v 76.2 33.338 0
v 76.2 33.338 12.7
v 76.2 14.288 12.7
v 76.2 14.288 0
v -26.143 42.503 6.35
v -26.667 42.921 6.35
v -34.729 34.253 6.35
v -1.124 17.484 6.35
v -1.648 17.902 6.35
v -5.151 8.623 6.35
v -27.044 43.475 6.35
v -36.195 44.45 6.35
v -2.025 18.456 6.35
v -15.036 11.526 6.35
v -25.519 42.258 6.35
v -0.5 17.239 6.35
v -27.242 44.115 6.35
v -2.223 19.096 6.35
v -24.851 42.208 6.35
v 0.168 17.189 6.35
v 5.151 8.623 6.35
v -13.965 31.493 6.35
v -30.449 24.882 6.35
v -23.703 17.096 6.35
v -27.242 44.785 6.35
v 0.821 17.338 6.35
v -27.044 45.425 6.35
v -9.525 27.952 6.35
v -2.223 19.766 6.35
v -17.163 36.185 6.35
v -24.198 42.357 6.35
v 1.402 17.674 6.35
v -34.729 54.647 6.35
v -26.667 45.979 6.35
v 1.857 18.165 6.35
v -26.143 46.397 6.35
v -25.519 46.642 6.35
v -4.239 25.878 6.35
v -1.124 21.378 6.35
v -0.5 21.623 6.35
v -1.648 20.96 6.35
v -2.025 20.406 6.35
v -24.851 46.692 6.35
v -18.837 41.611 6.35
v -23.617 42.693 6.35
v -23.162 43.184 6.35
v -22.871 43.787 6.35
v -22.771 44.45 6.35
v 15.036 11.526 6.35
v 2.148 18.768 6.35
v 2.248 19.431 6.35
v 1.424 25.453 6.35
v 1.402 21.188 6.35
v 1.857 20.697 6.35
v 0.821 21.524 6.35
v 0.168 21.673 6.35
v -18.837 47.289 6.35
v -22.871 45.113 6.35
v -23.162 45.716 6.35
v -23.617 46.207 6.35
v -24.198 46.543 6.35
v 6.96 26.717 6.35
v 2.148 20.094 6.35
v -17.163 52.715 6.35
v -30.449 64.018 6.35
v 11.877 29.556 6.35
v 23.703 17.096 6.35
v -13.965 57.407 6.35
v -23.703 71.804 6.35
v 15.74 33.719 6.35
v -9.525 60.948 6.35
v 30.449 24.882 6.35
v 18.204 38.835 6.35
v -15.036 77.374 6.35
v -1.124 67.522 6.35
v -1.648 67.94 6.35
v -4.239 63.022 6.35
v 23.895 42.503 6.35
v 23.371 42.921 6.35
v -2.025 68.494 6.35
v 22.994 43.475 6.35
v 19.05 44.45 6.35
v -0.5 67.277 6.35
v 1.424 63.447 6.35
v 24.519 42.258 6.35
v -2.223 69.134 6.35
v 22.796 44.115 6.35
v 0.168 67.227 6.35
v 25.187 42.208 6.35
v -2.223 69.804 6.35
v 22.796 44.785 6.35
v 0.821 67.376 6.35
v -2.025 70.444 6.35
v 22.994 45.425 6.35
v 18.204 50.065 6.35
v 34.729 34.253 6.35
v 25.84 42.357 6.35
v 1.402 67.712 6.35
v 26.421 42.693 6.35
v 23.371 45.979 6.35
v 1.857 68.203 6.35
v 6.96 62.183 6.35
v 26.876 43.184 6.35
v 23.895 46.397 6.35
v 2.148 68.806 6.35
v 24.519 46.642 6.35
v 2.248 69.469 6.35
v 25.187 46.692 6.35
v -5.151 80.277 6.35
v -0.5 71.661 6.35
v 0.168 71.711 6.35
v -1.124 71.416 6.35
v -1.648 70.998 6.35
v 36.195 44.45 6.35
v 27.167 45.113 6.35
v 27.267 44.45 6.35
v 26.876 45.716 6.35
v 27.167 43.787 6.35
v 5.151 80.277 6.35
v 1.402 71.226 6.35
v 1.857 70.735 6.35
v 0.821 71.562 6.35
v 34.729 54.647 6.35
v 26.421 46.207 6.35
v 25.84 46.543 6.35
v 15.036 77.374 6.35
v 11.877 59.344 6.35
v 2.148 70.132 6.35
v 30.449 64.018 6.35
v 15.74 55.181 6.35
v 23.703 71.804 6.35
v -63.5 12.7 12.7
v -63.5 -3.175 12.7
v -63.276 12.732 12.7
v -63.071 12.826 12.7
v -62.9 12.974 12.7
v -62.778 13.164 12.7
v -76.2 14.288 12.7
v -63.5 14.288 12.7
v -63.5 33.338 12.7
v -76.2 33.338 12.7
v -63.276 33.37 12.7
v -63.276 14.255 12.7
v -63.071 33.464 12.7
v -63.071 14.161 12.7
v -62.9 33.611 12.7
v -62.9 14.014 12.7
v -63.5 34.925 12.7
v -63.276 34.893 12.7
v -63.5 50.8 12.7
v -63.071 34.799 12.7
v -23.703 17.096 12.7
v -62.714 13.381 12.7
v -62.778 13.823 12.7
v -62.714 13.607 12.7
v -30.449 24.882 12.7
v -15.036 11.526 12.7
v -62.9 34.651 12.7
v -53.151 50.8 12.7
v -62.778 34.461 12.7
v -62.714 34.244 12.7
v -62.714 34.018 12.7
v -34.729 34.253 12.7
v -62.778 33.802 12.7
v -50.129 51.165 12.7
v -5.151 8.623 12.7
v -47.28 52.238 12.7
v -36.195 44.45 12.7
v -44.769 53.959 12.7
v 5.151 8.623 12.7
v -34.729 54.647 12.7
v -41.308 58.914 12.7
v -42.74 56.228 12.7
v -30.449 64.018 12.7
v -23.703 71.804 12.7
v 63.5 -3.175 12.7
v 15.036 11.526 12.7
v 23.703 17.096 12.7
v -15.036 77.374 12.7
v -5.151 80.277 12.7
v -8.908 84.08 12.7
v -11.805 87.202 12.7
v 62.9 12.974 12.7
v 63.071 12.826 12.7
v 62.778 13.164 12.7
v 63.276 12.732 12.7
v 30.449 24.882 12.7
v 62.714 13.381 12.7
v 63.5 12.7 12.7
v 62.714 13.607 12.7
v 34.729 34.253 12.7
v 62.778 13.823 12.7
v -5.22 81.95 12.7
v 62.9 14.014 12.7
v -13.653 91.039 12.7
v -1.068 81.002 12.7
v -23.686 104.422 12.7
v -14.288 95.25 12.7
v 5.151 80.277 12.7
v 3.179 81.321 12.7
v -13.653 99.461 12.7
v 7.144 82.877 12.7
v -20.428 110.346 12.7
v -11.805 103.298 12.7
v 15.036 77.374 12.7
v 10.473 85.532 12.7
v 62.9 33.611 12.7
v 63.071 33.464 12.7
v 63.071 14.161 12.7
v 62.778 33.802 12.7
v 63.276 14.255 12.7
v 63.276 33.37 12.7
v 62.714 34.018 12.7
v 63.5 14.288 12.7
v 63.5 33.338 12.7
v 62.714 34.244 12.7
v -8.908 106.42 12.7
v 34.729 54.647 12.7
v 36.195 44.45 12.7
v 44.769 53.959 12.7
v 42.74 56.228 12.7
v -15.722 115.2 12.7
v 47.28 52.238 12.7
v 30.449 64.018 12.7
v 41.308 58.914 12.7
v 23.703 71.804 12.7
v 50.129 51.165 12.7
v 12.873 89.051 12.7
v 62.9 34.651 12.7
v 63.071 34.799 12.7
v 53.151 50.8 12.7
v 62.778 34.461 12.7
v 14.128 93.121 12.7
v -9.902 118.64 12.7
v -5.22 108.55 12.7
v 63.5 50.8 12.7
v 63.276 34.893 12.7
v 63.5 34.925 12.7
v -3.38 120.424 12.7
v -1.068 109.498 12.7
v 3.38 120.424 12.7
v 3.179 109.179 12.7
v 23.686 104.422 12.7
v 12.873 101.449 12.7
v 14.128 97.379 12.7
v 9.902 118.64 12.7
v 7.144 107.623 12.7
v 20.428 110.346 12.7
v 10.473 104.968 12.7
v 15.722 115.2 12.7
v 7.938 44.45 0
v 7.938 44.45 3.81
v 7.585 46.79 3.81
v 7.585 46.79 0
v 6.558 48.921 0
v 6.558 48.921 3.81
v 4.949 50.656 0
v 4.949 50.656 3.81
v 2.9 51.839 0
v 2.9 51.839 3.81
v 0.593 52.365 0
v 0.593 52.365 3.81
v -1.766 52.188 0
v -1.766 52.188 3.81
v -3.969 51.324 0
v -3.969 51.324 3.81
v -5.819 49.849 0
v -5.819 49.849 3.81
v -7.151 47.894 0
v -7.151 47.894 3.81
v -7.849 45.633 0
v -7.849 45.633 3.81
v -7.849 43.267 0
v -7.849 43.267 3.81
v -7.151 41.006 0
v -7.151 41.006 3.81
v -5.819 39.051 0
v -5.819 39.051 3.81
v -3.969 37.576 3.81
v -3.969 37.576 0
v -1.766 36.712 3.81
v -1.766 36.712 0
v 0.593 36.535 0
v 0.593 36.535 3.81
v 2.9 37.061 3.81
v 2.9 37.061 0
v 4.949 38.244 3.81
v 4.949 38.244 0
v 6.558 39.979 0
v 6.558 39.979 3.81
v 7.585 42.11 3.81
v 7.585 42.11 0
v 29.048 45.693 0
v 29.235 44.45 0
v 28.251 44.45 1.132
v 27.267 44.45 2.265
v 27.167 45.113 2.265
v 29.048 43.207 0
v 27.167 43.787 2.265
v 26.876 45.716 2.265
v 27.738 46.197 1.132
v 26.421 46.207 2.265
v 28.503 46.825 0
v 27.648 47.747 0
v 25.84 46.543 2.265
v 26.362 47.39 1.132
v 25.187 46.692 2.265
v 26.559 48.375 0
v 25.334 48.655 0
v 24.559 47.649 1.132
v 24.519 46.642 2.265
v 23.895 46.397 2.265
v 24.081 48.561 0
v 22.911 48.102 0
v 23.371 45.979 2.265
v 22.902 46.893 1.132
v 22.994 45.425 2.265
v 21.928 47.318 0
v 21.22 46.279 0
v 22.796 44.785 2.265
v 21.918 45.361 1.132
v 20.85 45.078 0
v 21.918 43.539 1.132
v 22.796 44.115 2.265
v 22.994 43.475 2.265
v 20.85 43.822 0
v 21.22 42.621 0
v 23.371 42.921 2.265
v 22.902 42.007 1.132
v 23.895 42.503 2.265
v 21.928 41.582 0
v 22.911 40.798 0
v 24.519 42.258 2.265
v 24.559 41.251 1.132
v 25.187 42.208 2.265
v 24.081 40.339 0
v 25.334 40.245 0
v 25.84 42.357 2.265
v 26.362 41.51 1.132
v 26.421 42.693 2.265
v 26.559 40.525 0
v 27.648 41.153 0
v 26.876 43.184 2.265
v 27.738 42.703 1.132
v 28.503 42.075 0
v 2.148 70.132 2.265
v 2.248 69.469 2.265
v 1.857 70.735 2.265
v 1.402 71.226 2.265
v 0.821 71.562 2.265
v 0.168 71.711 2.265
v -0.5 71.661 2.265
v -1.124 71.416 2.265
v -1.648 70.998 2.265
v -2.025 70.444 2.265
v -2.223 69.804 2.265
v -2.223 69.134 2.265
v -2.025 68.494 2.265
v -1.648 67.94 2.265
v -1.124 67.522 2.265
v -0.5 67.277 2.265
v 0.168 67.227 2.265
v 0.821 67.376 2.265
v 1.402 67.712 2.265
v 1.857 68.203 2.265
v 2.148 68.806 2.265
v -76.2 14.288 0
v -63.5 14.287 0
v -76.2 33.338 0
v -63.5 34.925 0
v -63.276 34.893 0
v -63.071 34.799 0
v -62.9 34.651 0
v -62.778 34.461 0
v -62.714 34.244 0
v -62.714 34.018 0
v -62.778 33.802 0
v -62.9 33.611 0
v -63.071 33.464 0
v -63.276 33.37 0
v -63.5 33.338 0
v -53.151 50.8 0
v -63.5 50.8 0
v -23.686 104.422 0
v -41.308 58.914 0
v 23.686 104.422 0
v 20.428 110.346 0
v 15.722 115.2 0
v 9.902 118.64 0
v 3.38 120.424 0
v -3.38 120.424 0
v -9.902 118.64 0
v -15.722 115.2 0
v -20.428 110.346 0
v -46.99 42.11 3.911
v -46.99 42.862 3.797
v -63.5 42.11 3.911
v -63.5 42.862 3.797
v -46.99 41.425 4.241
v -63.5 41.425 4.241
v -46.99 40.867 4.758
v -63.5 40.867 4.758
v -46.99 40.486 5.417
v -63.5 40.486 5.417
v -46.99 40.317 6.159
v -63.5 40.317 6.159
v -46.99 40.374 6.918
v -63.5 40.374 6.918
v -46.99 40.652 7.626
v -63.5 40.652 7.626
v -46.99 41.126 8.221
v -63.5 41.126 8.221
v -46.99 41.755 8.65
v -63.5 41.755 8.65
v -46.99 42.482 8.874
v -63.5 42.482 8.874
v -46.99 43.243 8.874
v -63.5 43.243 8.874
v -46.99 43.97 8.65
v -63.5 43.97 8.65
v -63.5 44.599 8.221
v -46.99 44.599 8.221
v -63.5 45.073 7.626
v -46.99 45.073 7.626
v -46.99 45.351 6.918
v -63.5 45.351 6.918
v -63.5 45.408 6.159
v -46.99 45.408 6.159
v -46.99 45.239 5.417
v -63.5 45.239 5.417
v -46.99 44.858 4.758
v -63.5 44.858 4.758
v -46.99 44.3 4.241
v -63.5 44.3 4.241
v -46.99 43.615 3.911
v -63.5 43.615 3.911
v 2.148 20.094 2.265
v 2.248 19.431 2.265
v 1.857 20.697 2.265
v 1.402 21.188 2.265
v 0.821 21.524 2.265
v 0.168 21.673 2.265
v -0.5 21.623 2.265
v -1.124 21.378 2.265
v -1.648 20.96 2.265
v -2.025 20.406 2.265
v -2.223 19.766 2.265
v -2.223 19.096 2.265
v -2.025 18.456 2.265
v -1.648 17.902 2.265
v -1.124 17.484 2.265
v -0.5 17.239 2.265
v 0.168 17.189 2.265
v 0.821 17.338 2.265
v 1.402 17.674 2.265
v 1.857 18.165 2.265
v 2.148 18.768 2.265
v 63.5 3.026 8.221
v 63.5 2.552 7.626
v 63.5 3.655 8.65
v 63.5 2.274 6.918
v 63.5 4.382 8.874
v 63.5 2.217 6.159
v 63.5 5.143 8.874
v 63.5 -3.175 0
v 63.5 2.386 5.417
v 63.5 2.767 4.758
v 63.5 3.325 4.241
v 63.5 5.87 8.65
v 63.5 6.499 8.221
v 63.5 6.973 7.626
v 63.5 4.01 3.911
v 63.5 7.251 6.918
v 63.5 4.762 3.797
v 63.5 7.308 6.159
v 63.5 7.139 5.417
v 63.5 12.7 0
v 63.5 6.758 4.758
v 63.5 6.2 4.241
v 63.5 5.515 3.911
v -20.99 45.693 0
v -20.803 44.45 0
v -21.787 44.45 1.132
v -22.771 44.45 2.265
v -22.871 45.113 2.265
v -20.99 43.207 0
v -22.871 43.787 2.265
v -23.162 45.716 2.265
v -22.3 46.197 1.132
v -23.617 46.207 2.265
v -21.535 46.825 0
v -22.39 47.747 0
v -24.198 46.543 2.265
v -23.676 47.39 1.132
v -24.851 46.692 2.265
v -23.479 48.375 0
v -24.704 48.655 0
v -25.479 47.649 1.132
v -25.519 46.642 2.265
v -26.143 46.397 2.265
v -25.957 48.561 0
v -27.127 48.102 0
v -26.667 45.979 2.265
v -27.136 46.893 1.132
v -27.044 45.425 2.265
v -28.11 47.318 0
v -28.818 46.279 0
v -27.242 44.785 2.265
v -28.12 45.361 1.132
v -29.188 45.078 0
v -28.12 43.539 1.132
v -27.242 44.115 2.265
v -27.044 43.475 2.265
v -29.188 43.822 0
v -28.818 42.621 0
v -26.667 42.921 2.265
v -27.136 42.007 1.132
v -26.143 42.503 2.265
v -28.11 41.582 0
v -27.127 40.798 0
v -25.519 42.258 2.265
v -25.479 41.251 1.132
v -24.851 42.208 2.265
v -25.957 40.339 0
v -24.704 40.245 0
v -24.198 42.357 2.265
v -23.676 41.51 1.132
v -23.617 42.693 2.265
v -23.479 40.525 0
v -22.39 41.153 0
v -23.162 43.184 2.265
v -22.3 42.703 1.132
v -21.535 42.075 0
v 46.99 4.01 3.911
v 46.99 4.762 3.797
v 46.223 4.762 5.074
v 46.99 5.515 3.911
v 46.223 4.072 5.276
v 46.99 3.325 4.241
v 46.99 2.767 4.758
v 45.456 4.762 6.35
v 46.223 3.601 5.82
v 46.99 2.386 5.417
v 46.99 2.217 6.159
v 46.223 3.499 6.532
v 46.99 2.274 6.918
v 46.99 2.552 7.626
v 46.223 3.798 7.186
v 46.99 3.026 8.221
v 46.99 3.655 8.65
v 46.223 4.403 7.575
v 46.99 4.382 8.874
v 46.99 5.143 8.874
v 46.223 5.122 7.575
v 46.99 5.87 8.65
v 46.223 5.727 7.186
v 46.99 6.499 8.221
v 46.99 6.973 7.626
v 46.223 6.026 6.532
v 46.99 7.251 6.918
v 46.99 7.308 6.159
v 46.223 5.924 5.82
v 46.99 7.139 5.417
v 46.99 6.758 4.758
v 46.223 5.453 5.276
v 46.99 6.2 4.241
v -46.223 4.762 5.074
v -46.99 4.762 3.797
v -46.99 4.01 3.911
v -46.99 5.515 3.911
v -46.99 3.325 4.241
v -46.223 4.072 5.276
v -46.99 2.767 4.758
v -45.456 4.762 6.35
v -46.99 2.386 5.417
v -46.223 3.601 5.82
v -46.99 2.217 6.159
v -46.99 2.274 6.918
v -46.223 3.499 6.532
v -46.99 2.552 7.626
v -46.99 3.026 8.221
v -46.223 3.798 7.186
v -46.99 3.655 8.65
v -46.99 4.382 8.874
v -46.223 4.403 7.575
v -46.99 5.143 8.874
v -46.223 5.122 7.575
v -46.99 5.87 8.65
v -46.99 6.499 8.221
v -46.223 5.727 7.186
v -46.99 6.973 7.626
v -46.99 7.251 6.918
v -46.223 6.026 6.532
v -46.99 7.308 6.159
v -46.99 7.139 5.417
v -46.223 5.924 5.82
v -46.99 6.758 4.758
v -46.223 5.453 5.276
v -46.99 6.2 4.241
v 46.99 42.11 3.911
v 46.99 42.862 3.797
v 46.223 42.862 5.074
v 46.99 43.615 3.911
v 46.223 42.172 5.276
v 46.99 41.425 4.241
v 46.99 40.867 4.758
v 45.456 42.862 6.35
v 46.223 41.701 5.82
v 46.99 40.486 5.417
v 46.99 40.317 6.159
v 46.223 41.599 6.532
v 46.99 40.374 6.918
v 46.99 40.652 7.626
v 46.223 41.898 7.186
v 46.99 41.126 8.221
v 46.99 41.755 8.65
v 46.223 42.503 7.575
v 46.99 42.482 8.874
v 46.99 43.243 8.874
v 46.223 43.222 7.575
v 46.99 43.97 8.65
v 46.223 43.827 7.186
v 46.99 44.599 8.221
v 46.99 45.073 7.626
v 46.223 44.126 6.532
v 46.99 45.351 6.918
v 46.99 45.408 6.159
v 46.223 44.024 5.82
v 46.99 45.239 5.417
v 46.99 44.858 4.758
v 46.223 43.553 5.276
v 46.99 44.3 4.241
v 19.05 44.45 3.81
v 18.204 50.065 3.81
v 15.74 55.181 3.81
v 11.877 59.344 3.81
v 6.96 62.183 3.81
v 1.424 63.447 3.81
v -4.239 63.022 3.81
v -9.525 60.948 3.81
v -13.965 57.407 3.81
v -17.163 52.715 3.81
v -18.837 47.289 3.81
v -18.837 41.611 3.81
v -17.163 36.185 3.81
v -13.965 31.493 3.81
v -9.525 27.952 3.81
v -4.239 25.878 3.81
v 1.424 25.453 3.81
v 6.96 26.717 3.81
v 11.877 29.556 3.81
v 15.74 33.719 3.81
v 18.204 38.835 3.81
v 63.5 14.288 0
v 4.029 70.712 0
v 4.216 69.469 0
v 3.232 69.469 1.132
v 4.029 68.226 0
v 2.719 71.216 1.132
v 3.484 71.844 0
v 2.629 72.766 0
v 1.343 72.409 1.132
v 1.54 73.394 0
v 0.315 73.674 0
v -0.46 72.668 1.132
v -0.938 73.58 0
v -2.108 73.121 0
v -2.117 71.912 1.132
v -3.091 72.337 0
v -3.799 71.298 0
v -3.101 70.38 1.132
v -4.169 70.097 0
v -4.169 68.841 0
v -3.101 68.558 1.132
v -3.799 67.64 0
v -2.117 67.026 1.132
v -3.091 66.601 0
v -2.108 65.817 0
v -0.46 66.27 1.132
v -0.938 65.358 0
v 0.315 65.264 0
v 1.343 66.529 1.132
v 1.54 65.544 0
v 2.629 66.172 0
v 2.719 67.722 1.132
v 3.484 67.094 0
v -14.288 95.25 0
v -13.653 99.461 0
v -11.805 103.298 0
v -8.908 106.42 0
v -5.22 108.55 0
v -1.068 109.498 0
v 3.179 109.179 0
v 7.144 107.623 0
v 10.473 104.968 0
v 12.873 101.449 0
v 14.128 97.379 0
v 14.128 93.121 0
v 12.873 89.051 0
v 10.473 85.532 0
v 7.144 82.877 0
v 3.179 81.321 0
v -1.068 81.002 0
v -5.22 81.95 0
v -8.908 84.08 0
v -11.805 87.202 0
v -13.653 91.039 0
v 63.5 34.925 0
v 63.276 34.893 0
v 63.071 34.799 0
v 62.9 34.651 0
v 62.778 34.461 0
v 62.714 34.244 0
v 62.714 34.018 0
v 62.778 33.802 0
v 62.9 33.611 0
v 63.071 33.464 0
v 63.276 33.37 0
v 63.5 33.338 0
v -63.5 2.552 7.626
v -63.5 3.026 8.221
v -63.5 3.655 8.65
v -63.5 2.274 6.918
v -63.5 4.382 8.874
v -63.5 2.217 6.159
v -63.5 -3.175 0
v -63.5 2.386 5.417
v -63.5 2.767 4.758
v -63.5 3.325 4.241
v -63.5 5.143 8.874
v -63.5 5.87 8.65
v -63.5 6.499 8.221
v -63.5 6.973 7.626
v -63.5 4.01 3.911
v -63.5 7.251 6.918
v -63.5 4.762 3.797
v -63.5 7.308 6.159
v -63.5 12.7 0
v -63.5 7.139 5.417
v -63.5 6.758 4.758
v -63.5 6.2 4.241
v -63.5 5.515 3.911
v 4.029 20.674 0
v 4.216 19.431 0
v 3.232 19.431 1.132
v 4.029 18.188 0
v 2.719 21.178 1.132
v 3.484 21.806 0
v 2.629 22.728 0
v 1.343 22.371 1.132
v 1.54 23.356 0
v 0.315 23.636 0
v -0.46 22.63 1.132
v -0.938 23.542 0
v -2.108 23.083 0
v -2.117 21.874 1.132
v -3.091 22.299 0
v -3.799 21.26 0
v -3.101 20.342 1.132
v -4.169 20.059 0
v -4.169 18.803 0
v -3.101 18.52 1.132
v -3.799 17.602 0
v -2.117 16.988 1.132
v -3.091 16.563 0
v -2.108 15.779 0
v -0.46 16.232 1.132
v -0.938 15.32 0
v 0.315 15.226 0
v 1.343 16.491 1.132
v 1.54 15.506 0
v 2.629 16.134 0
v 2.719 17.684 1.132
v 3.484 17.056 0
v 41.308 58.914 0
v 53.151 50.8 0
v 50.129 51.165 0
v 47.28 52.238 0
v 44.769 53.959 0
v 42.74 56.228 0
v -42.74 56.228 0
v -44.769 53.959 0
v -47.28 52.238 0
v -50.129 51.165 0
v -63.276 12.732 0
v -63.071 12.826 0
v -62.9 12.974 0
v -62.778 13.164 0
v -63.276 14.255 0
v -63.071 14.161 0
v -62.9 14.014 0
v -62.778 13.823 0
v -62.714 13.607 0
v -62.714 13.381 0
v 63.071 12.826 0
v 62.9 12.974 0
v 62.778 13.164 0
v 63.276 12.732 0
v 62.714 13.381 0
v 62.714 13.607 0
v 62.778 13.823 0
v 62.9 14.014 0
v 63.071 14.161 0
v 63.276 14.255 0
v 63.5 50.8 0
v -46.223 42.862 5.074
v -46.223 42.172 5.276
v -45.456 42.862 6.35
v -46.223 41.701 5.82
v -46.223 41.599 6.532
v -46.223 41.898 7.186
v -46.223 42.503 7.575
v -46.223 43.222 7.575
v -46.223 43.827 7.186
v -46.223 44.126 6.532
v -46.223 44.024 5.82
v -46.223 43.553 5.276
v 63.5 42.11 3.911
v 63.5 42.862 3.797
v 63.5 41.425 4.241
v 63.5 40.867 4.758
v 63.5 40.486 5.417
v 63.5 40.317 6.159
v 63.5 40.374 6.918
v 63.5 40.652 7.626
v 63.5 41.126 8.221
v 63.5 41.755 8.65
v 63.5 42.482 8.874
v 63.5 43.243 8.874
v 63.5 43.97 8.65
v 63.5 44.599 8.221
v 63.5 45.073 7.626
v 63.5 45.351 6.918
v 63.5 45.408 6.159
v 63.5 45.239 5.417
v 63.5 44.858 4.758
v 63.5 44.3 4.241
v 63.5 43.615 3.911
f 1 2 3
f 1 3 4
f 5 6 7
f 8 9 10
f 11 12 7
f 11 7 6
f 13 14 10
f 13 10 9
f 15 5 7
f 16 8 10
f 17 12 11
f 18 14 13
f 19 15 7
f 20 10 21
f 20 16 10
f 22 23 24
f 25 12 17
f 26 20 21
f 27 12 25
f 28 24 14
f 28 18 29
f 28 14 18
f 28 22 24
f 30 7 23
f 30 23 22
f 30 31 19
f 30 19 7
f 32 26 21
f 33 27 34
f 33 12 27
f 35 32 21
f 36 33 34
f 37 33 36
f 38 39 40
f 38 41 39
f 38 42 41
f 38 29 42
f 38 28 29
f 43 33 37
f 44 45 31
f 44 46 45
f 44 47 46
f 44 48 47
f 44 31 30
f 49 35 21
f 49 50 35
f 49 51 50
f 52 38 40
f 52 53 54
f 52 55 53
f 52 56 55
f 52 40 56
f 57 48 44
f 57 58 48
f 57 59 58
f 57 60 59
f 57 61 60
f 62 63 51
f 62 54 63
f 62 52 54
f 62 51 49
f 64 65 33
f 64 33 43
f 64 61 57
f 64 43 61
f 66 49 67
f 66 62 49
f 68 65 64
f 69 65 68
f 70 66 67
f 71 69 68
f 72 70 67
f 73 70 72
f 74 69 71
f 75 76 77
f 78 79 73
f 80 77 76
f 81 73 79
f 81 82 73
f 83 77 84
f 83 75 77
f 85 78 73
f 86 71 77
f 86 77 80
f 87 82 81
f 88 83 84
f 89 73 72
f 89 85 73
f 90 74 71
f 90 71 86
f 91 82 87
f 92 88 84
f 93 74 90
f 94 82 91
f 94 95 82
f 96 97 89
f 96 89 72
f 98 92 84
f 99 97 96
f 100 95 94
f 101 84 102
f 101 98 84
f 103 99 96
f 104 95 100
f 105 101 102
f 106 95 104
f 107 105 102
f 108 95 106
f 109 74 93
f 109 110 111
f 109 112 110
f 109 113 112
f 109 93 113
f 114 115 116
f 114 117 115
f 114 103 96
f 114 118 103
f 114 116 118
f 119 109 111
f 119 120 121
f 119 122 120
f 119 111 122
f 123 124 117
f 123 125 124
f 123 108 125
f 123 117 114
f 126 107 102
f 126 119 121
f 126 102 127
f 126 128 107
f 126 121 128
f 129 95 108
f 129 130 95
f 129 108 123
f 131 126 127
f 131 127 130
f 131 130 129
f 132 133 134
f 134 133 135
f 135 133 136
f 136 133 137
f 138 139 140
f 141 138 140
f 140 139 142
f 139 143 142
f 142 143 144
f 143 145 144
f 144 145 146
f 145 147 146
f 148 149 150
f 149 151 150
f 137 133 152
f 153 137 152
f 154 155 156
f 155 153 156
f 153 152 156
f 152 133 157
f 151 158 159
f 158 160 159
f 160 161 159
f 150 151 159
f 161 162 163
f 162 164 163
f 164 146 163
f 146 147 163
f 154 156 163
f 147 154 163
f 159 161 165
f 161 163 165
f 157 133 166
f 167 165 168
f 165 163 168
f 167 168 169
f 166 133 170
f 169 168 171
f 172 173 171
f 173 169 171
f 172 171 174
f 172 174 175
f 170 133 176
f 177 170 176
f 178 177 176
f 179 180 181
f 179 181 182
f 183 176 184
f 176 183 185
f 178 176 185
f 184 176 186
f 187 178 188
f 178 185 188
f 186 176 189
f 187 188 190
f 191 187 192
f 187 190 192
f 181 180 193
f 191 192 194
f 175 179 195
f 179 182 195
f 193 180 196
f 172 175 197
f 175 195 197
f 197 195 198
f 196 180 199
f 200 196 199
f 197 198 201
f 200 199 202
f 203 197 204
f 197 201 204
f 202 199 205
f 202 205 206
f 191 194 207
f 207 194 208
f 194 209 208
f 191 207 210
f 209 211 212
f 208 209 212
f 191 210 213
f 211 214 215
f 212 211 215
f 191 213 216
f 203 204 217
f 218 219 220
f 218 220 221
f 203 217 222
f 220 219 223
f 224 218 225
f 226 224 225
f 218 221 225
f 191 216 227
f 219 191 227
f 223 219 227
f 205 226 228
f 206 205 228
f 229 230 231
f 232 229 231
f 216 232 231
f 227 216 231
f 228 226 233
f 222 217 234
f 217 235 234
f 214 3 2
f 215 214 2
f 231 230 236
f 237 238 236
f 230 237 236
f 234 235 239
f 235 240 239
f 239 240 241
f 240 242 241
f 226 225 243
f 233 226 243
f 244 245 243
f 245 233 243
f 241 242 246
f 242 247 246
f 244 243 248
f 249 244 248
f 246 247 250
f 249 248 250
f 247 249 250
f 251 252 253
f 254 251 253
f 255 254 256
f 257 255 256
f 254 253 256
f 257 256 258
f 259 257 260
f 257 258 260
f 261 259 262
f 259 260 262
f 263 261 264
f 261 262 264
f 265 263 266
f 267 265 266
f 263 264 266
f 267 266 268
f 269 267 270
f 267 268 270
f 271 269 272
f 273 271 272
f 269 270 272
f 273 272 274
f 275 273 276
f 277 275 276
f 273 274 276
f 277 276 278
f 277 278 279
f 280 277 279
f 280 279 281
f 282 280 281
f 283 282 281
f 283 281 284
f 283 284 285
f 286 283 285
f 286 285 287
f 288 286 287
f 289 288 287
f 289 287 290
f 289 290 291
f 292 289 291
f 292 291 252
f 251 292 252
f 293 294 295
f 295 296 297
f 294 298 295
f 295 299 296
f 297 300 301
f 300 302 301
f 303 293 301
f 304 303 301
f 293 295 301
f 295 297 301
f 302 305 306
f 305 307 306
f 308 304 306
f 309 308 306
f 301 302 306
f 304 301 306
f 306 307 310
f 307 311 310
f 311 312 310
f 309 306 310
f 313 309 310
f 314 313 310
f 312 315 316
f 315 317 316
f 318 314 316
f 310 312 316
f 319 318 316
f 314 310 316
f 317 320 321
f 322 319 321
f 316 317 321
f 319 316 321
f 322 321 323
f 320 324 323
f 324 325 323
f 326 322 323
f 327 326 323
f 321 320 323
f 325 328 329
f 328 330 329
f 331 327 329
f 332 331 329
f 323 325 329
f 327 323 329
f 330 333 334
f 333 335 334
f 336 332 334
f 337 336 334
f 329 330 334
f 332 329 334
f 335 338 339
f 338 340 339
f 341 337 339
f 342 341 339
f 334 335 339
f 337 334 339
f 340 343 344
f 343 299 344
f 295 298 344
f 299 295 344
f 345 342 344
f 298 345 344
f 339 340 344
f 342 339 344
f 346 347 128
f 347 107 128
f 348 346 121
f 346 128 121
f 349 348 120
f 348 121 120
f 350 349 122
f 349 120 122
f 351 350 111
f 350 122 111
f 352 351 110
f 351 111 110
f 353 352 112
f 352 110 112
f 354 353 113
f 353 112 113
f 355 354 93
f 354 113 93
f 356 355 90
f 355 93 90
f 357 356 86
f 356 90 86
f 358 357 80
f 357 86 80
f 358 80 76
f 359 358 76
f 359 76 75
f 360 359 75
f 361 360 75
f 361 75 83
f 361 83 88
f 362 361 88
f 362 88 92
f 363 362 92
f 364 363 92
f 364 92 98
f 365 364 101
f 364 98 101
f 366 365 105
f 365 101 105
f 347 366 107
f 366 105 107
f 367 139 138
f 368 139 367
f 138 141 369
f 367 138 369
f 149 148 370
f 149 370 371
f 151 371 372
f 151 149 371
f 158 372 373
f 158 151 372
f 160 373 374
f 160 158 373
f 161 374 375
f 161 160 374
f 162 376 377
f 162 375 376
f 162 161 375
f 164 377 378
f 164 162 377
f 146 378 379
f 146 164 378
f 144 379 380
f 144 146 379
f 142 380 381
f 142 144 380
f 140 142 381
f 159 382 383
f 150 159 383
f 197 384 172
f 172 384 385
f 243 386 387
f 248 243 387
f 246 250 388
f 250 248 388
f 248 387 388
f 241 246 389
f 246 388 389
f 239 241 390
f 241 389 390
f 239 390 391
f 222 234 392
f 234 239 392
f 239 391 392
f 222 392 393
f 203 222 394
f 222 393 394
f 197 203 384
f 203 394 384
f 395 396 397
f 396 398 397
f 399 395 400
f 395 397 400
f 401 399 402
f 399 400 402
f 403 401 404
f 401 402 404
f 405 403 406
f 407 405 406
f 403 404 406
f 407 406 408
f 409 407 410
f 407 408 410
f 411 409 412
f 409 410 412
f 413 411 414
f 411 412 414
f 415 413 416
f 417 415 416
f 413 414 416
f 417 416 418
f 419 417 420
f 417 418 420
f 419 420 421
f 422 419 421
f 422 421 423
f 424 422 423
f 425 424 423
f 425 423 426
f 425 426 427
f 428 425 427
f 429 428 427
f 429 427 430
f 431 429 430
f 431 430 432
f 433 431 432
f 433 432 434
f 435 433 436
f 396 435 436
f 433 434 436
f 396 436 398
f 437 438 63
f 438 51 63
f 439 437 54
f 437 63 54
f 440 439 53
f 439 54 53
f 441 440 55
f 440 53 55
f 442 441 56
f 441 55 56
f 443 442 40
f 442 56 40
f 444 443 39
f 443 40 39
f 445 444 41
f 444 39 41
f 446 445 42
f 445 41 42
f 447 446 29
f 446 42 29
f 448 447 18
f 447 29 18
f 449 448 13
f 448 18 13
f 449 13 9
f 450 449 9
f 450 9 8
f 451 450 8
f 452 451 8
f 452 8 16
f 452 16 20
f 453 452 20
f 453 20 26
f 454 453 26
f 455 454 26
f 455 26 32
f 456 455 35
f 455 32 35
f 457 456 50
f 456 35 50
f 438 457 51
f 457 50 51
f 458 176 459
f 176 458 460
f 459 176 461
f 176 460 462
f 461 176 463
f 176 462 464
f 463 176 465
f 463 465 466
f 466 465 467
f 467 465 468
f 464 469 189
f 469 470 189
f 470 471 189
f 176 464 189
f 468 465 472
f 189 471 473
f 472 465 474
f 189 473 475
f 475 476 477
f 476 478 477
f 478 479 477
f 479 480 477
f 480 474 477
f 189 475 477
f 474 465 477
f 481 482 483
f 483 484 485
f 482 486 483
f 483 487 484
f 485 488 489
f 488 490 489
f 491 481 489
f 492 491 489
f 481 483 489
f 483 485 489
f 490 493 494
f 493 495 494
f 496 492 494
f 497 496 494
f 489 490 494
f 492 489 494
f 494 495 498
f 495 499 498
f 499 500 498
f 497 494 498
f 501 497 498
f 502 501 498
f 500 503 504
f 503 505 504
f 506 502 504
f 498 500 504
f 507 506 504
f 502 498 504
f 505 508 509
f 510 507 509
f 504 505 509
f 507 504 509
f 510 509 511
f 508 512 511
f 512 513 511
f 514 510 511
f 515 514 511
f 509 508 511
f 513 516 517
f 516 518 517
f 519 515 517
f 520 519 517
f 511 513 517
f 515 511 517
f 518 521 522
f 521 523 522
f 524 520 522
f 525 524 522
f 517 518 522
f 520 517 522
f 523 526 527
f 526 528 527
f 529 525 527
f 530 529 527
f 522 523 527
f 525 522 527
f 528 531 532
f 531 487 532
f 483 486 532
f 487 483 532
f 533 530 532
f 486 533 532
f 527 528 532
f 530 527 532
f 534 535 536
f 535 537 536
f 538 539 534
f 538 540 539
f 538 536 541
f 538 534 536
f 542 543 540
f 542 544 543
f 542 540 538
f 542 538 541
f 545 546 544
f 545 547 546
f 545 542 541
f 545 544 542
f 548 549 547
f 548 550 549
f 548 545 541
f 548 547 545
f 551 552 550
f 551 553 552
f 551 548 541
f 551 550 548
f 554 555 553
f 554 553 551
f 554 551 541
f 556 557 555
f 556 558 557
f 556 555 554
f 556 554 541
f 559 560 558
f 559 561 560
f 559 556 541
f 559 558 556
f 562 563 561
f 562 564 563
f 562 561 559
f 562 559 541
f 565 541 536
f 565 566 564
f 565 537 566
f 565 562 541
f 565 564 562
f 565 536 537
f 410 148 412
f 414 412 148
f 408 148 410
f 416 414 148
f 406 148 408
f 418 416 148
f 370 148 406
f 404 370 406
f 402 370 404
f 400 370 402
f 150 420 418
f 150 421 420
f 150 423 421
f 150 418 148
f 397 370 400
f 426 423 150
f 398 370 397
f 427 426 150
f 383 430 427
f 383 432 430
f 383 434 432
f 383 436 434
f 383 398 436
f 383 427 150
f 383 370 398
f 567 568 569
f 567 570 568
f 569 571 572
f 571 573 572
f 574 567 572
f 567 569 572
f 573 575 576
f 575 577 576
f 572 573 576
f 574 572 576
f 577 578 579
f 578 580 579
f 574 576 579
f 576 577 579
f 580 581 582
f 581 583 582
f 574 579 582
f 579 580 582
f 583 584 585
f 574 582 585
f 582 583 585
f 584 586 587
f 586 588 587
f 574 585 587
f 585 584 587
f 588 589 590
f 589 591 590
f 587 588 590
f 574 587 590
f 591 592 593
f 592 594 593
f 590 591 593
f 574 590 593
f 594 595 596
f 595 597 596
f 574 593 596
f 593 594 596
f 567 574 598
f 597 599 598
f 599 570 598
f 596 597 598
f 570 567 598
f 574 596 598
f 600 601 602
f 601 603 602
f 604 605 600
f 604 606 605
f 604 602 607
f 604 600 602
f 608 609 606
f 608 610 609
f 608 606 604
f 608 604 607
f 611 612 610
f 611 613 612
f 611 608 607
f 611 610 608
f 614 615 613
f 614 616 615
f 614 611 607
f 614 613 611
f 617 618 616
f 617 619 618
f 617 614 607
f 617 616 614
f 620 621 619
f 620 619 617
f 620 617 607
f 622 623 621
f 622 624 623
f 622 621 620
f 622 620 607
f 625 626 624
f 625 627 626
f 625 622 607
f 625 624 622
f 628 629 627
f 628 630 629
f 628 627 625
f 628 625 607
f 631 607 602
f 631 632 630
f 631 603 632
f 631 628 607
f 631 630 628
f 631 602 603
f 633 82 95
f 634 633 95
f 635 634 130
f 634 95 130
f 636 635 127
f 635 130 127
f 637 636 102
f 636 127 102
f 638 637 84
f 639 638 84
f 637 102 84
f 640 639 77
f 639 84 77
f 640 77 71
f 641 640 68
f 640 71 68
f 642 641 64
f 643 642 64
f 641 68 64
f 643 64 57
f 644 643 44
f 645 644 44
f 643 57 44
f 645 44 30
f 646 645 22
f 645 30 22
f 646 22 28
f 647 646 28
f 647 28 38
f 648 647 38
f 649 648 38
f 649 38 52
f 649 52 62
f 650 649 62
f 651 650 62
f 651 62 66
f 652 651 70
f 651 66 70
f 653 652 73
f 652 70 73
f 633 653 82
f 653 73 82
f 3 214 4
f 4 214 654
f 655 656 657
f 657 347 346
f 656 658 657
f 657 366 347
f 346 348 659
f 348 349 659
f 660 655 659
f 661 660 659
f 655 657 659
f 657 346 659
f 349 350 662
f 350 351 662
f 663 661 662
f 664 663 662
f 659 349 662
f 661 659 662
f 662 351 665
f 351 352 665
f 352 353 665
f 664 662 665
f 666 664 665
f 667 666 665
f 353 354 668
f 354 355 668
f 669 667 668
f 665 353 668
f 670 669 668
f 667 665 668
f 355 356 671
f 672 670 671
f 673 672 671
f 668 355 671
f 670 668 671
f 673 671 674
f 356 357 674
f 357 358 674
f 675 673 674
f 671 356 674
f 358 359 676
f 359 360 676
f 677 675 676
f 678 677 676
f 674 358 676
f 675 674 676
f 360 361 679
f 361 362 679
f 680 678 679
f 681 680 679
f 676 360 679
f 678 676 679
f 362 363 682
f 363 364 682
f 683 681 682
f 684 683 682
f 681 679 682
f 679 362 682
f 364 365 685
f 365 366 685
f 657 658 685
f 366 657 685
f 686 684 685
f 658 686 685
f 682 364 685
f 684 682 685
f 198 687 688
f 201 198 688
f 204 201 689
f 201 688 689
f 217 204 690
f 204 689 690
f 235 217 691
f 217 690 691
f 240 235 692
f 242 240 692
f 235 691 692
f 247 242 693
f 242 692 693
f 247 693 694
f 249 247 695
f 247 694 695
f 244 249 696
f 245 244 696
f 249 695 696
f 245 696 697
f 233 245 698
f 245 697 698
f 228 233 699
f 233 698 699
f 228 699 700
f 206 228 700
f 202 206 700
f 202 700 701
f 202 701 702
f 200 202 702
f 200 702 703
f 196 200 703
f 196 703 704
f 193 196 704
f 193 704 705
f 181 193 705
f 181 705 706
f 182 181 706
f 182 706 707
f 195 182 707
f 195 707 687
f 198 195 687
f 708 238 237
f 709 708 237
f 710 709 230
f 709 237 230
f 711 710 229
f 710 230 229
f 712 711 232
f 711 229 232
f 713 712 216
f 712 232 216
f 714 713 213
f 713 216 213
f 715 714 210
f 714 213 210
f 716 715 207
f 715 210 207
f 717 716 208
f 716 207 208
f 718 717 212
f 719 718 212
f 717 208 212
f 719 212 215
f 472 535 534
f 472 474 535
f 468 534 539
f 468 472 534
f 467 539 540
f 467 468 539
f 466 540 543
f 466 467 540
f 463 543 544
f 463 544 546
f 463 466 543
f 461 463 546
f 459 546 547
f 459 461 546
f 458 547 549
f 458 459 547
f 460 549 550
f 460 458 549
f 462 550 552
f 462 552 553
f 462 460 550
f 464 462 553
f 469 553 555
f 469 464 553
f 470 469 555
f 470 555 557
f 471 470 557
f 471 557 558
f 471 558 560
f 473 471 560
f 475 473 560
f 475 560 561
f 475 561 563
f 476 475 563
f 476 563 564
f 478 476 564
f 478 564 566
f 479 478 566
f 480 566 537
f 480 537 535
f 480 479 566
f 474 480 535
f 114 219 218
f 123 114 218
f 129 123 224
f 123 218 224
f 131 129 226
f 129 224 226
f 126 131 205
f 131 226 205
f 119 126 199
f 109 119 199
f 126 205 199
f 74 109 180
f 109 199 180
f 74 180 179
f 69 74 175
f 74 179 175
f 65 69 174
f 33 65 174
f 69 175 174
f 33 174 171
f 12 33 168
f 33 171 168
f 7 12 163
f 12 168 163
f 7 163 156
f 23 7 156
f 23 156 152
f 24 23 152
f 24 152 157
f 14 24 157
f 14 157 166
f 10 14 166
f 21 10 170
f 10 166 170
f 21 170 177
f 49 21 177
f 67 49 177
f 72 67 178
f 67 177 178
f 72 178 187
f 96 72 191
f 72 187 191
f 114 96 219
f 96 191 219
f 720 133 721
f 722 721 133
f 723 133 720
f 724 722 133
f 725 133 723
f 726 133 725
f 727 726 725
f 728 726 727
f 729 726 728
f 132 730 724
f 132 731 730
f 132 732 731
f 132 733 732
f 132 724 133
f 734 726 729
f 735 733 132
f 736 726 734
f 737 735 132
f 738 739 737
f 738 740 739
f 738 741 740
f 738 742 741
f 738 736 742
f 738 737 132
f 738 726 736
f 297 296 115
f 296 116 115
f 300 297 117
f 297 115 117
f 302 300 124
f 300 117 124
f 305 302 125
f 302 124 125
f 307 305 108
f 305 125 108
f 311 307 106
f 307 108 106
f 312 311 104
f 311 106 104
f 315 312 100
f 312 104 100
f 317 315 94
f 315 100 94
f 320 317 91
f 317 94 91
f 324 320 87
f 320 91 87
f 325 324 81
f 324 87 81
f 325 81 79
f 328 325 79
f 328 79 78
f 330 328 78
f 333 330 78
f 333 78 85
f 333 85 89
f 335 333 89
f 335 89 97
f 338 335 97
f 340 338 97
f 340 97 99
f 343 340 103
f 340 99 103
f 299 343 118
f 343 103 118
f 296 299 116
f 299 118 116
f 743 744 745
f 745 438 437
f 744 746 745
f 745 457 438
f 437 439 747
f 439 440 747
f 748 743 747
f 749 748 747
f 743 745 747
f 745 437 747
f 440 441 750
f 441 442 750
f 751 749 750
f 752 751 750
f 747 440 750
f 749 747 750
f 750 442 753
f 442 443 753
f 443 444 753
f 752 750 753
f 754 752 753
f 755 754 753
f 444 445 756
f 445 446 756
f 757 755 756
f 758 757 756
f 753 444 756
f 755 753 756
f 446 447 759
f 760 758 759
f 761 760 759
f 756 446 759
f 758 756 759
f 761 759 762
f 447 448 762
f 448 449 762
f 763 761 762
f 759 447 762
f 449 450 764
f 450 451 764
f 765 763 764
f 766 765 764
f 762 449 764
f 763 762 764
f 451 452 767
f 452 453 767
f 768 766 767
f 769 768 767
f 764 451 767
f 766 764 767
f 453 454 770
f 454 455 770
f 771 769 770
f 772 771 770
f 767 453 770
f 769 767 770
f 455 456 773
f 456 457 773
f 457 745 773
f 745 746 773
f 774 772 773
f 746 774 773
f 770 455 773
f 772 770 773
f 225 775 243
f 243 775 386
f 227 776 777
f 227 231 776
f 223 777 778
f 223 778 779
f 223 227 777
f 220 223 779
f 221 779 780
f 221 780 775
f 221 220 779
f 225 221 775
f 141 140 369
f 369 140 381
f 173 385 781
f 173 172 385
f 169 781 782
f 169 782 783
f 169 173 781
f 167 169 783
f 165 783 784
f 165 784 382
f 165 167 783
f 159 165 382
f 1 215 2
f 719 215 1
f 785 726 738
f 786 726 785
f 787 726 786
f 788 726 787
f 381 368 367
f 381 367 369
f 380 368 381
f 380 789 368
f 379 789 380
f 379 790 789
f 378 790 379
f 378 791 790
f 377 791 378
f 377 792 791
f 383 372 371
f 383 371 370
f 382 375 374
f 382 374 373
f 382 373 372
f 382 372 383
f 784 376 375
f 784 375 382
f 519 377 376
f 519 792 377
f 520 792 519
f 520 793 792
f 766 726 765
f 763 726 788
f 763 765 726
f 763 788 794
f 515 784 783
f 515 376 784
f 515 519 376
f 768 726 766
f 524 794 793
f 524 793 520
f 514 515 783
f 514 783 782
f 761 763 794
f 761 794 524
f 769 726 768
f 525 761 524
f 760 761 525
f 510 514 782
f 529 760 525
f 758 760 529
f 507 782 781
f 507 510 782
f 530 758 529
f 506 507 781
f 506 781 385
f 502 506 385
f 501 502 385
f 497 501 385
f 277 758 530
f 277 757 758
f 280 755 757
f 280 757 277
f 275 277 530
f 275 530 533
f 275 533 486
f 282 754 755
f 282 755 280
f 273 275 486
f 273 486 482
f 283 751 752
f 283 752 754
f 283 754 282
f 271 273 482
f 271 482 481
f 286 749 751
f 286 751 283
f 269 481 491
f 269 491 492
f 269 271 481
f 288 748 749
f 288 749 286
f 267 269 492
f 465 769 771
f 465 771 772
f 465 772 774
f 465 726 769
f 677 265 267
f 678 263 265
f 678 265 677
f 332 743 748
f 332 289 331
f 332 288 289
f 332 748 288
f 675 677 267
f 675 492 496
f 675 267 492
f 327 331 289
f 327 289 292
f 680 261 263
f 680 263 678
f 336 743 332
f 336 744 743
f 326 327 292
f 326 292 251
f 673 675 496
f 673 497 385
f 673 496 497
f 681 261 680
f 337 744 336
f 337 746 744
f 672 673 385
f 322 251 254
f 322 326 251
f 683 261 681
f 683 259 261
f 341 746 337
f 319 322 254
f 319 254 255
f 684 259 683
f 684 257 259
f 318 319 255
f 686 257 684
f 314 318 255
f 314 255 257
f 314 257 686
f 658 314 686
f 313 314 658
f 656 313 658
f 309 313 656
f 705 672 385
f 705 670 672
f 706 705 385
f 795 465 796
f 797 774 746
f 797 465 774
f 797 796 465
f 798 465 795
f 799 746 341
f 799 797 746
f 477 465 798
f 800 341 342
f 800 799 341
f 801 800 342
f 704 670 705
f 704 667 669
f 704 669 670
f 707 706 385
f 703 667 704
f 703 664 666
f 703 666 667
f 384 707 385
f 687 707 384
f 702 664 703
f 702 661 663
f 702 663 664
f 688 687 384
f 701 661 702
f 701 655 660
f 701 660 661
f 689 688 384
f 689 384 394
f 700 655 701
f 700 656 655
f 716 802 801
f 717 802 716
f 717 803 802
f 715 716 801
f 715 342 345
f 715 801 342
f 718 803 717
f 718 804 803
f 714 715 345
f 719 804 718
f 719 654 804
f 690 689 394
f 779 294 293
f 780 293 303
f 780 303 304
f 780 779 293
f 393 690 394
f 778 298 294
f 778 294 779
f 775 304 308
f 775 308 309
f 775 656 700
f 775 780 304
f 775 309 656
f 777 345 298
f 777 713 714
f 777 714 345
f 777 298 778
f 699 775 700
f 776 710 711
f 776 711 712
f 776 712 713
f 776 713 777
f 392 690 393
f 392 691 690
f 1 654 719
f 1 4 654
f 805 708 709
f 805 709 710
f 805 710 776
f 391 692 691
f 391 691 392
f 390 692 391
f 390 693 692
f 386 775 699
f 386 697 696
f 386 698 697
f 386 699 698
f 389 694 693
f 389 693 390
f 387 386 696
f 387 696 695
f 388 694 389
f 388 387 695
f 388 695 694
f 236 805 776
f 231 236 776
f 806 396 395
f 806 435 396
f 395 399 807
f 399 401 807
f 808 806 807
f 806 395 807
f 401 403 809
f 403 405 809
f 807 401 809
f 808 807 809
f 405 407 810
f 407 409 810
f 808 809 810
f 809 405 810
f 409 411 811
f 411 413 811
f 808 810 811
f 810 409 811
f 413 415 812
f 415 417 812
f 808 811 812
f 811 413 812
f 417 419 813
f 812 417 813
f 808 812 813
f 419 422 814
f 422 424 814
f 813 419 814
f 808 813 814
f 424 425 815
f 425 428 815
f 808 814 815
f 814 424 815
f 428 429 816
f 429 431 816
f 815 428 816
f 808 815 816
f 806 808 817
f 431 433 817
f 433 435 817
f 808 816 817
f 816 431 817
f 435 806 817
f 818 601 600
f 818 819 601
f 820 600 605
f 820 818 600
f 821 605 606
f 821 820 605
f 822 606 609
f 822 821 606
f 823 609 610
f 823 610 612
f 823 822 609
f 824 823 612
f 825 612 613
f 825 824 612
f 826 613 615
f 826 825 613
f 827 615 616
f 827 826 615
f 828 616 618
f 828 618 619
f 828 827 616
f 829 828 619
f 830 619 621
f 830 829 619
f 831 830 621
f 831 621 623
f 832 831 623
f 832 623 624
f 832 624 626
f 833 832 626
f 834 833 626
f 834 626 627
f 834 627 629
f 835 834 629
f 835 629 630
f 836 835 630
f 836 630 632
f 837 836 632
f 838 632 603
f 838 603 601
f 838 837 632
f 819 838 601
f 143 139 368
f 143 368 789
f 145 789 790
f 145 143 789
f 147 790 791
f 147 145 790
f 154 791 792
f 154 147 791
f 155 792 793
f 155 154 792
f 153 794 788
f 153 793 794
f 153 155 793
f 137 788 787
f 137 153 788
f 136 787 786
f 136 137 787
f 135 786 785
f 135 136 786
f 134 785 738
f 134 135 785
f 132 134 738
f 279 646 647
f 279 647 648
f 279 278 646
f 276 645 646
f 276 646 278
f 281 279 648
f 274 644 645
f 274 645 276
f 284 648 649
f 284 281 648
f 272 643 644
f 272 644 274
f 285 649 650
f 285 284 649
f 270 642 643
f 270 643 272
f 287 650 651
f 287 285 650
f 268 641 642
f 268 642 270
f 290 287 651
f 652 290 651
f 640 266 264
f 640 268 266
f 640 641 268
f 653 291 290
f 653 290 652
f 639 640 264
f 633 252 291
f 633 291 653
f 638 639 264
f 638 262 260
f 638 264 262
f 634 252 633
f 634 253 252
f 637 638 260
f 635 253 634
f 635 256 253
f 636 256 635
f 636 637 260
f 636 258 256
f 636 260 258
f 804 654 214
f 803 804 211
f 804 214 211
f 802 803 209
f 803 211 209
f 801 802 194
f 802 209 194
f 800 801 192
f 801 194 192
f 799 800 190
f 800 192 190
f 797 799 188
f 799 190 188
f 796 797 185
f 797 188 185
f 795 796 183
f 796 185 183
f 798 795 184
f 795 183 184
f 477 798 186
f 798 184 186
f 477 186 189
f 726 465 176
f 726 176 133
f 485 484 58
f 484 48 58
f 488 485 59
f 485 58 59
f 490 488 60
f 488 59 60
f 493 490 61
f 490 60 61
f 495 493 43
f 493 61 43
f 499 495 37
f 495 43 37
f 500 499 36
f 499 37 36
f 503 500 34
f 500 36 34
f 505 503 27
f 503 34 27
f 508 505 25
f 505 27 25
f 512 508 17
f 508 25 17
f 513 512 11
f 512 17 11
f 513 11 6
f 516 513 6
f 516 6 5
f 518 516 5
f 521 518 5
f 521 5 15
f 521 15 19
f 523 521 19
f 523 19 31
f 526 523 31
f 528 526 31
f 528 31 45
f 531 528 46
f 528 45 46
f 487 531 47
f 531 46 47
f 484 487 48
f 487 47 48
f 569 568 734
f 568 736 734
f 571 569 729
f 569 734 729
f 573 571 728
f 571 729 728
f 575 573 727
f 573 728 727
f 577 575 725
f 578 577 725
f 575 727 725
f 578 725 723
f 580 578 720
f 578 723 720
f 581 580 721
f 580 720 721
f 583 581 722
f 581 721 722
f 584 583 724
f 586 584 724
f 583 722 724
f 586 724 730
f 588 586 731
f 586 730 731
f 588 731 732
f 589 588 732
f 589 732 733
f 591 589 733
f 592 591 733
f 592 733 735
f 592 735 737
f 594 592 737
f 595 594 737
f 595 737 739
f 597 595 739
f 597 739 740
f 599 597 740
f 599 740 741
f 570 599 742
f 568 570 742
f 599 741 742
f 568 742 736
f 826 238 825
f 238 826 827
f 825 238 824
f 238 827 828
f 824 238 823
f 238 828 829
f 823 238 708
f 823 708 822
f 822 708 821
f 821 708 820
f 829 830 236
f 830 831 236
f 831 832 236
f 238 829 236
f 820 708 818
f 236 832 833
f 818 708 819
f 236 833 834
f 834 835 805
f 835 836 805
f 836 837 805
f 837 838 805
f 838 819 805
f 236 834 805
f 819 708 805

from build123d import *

# Parameters (mm, degrees)
SKETCH1_W                                      = 127
SKETCH1_H                                      = 152.4
BOSS_EXTRUDE1_DEPTH                            = 12.7
SKETCH2_R                                      = 14.2875
CUT_EXTRUDE1_DEPTH                             = 13.7
SKETCH3_R                                      = 7.9375
SKETCH3_R_2                                    = 1.016
CUT_EXTRUDE2_DEPTH                             = 13.7
SKETCH4_R                                      = 36.195
CUT_EXTRUDE3_DEPTH                             = 6.35
SKETCH5_R                                      = 19.05
CUT_EXTRUDE4_DEPTH                             = 2.54
CSK_FOR_8_FLAT_HEAD_MACHINE_SCREW1_D           = 4.4958
CSK_FOR_8_FLAT_HEAD_MACHINE_SCREW1_CSINK_D     = 8.4328
CSK_FOR_8_FLAT_HEAD_MACHINE_SCREW1_CSINK_ANGLE = 82
FILLET1_R                                      = 12.7
SKETCH8_W                                      = 127
SKETCH8_H                                      = 3.175
BOSS_EXTRUDE2_DEPTH                            = 12.7
F_1_4_20_TAPPED_HOLE1_AT_2_COUNT               = 2
F_1_4_20_TAPPED_HOLE1_AT_2_PITCH               = 38.1
SKETCH11_W                                     = 12.7
SKETCH11_H                                     = 19.05
BOSS_EXTRUDE3_DEPTH                            = 12.7
SKETCH12_R                                     = 0.79375
CUT_EXTRUDE5_DEPTH                             = 13.7


with BuildPart() as part:
    # Sketch1 → Boss-Extrude1 (new body)
    with BuildSketch(Plane.XY):
        with Locations((0, 76.2)):
            Rectangle(SKETCH1_W, SKETCH1_H)
    extrude(amount=BOSS_EXTRUDE1_DEPTH)

    # Sketch2 → Cut-Extrude1 (cut, through all)
    with BuildSketch(Plane(origin=(0, 0, 0), x_dir=(-1, 0, 0), z_dir=(0, 0, -1))):
        with BuildLine():
            Line((44.45, 50.8), (63.5, 50.8))
            Line((63.5, 50.8), (63.5, 152.4))
            Line((63.5, 152.4), (-63.5, 152.4))
            Line((-63.5, 152.4), (-63.5, 50.8))
            Line((-63.5, 50.8), (-44.45, 50.8))
            Line((-44.45, 50.8), (-23.686198751, 104.421913036))
            ThreePointArc((-23.686198751, 104.421913036), (0, 120.65), (23.686198751, 104.421913036))
            Line((23.686198751, 104.421913036), (44.45, 50.8))
        make_face()
        with Locations((0, 95.25)):
            Circle(SKETCH2_R)
    extrude(amount=-CUT_EXTRUDE1_DEPTH, mode=Mode.SUBTRACT)

    # Sketch3 → Cut-Extrude2 (cut, through all)
    with BuildSketch(Plane.XY.offset(12.7)):
        with Locations((0, 44.45)):
            Circle(SKETCH3_R)
        with Locations((-25.019, 44.45)):
            Circle(SKETCH3_R_2)
        with Locations((25.019, 44.45)):
            Circle(SKETCH3_R_2)
        with Locations((0, 69.469)):
            Circle(SKETCH3_R_2)
        with Locations((0, 19.431)):
            Circle(SKETCH3_R_2)
    extrude(amount=-CUT_EXTRUDE2_DEPTH, mode=Mode.SUBTRACT)

    # Sketch4 → Cut-Extrude3 (cut)
    with BuildSketch(Plane.XY.offset(12.7)):
        with Locations((0, 44.45)):
            Circle(SKETCH4_R)
    extrude(amount=-CUT_EXTRUDE3_DEPTH, mode=Mode.SUBTRACT)

    # Sketch5 → Cut-Extrude4 (cut)
    with BuildSketch(Plane.XY.offset(6.35)):
        with Locations((0, 44.45)):
            Circle(SKETCH5_R)
    extrude(amount=-CUT_EXTRUDE4_DEPTH, mode=Mode.SUBTRACT)

    # CSK for _8 Flat Head Machine Screw1 (through all)
    with Locations(Plane(origin=(0, 0, 0), x_dir=(-1, 0, 0), z_dir=(0, 0, -1))):
        with Locations((0, 69.469), (25.019, 44.45), (0, 19.431), (-25.019, 44.45)):
            CounterSinkHole(CSK_FOR_8_FLAT_HEAD_MACHINE_SCREW1_D / 2, CSK_FOR_8_FLAT_HEAD_MACHINE_SCREW1_CSINK_D / 2, counter_sink_angle=CSK_FOR_8_FLAT_HEAD_MACHINE_SCREW1_CSINK_ANGLE)

    # Fillet1
    fillet1_edges = [part.edges().sort_by_distance(p)[0] for p in [
        (44.45, 50.8, 6.35),
        (-44.45, 50.8, 6.35),
    ]]
    fillet(fillet1_edges, radius=FILLET1_R)

    # Sketch8 → Boss-Extrude2 (add)
    with BuildSketch(Plane(origin=(0, 0, 0), x_dir=(-1, 0, 0), z_dir=(0, 0, -1))):
        with Locations((0, -1.5875)):
            Rectangle(SKETCH8_W, SKETCH8_H)
    extrude(amount=-BOSS_EXTRUDE2_DEPTH)

    # Sketch9 → 1_4-20 Tapped Hole1 (revolve, cut)
    with BuildSketch(Plane(origin=(63.5, 42.8625, 6.35), x_dir=(0, 0, -1), z_dir=(0, 1, 0))):
        Polygon((0, 0), (0, 18.043816902), (2.5527, 16.51), (2.5527, 0), align=None)
    f_1_4_20_tapped_hole1 = revolve(axis=Axis((69.85, 42.8625, 6.35), (-1, 0, 0)), mode=Mode.SUBTRACT)

    # 1_4-20 Tapped Hole1 at 2: 1_4-20 Tapped Hole1 ×2
    with Locations(*[(0, -i * F_1_4_20_TAPPED_HOLE1_AT_2_PITCH, 0) for i in range(1, F_1_4_20_TAPPED_HOLE1_AT_2_COUNT)]):
        add(f_1_4_20_tapped_hole1, mode=Mode.SUBTRACT)

    # Sketch11 → Boss-Extrude3 (add)
    with BuildSketch(Plane(origin=(63.5, 0, 0), x_dir=(0, 0, -1), z_dir=(1, 0, 0))):
        with Locations((-6.35, 23.8125)):
            Rectangle(SKETCH11_W, SKETCH11_H)
    boss_extrude3 = extrude(amount=BOSS_EXTRUDE3_DEPTH)

    # Sketch12 → Cut-Extrude5 (cut, through all)
    with BuildSketch(Plane.XY.offset(12.7)):
        with Locations((63.5, 34.13125)):
            Circle(SKETCH12_R)
        with Locations((63.5, 13.49375)):
            Circle(SKETCH12_R)
    cut_extrude5 = extrude(amount=-CUT_EXTRUDE5_DEPTH, mode=Mode.SUBTRACT)

    # Mirror1: Cut-Extrude5, Boss-Extrude3, 1_4-20 Tapped Hole1 across plane
    add(cut_extrude5.mirror(Plane(origin=(0, 0, 0), x_dir=(0, 0, 1), z_dir=(1, 0, 0))), mode=Mode.SUBTRACT)
    add(boss_extrude3.mirror(Plane(origin=(0, 0, 0), x_dir=(0, 0, 1), z_dir=(1, 0, 0))))
    add(f_1_4_20_tapped_hole1.mirror(Plane(origin=(0, 0, 0), x_dir=(0, 0, 1), z_dir=(1, 0, 0))), mode=Mode.SUBTRACT)

    # Mirror1 copy 1 sketch → Mirror1 copy 1 (revolve, cut)
    with BuildSketch(Plane(origin=(-63.5, 4.7625, 6.35), x_dir=(0, 0, -1), z_dir=(0, 1, 0))):
        Polygon((0, 0), (0, -18.043816902), (2.5527, -16.51), (2.5527, 0), align=None)
    revolve(axis=Axis((-69.85, 4.7625, 6.35), (-1, 0, 0)), mode=Mode.SUBTRACT)


solid = part.part
